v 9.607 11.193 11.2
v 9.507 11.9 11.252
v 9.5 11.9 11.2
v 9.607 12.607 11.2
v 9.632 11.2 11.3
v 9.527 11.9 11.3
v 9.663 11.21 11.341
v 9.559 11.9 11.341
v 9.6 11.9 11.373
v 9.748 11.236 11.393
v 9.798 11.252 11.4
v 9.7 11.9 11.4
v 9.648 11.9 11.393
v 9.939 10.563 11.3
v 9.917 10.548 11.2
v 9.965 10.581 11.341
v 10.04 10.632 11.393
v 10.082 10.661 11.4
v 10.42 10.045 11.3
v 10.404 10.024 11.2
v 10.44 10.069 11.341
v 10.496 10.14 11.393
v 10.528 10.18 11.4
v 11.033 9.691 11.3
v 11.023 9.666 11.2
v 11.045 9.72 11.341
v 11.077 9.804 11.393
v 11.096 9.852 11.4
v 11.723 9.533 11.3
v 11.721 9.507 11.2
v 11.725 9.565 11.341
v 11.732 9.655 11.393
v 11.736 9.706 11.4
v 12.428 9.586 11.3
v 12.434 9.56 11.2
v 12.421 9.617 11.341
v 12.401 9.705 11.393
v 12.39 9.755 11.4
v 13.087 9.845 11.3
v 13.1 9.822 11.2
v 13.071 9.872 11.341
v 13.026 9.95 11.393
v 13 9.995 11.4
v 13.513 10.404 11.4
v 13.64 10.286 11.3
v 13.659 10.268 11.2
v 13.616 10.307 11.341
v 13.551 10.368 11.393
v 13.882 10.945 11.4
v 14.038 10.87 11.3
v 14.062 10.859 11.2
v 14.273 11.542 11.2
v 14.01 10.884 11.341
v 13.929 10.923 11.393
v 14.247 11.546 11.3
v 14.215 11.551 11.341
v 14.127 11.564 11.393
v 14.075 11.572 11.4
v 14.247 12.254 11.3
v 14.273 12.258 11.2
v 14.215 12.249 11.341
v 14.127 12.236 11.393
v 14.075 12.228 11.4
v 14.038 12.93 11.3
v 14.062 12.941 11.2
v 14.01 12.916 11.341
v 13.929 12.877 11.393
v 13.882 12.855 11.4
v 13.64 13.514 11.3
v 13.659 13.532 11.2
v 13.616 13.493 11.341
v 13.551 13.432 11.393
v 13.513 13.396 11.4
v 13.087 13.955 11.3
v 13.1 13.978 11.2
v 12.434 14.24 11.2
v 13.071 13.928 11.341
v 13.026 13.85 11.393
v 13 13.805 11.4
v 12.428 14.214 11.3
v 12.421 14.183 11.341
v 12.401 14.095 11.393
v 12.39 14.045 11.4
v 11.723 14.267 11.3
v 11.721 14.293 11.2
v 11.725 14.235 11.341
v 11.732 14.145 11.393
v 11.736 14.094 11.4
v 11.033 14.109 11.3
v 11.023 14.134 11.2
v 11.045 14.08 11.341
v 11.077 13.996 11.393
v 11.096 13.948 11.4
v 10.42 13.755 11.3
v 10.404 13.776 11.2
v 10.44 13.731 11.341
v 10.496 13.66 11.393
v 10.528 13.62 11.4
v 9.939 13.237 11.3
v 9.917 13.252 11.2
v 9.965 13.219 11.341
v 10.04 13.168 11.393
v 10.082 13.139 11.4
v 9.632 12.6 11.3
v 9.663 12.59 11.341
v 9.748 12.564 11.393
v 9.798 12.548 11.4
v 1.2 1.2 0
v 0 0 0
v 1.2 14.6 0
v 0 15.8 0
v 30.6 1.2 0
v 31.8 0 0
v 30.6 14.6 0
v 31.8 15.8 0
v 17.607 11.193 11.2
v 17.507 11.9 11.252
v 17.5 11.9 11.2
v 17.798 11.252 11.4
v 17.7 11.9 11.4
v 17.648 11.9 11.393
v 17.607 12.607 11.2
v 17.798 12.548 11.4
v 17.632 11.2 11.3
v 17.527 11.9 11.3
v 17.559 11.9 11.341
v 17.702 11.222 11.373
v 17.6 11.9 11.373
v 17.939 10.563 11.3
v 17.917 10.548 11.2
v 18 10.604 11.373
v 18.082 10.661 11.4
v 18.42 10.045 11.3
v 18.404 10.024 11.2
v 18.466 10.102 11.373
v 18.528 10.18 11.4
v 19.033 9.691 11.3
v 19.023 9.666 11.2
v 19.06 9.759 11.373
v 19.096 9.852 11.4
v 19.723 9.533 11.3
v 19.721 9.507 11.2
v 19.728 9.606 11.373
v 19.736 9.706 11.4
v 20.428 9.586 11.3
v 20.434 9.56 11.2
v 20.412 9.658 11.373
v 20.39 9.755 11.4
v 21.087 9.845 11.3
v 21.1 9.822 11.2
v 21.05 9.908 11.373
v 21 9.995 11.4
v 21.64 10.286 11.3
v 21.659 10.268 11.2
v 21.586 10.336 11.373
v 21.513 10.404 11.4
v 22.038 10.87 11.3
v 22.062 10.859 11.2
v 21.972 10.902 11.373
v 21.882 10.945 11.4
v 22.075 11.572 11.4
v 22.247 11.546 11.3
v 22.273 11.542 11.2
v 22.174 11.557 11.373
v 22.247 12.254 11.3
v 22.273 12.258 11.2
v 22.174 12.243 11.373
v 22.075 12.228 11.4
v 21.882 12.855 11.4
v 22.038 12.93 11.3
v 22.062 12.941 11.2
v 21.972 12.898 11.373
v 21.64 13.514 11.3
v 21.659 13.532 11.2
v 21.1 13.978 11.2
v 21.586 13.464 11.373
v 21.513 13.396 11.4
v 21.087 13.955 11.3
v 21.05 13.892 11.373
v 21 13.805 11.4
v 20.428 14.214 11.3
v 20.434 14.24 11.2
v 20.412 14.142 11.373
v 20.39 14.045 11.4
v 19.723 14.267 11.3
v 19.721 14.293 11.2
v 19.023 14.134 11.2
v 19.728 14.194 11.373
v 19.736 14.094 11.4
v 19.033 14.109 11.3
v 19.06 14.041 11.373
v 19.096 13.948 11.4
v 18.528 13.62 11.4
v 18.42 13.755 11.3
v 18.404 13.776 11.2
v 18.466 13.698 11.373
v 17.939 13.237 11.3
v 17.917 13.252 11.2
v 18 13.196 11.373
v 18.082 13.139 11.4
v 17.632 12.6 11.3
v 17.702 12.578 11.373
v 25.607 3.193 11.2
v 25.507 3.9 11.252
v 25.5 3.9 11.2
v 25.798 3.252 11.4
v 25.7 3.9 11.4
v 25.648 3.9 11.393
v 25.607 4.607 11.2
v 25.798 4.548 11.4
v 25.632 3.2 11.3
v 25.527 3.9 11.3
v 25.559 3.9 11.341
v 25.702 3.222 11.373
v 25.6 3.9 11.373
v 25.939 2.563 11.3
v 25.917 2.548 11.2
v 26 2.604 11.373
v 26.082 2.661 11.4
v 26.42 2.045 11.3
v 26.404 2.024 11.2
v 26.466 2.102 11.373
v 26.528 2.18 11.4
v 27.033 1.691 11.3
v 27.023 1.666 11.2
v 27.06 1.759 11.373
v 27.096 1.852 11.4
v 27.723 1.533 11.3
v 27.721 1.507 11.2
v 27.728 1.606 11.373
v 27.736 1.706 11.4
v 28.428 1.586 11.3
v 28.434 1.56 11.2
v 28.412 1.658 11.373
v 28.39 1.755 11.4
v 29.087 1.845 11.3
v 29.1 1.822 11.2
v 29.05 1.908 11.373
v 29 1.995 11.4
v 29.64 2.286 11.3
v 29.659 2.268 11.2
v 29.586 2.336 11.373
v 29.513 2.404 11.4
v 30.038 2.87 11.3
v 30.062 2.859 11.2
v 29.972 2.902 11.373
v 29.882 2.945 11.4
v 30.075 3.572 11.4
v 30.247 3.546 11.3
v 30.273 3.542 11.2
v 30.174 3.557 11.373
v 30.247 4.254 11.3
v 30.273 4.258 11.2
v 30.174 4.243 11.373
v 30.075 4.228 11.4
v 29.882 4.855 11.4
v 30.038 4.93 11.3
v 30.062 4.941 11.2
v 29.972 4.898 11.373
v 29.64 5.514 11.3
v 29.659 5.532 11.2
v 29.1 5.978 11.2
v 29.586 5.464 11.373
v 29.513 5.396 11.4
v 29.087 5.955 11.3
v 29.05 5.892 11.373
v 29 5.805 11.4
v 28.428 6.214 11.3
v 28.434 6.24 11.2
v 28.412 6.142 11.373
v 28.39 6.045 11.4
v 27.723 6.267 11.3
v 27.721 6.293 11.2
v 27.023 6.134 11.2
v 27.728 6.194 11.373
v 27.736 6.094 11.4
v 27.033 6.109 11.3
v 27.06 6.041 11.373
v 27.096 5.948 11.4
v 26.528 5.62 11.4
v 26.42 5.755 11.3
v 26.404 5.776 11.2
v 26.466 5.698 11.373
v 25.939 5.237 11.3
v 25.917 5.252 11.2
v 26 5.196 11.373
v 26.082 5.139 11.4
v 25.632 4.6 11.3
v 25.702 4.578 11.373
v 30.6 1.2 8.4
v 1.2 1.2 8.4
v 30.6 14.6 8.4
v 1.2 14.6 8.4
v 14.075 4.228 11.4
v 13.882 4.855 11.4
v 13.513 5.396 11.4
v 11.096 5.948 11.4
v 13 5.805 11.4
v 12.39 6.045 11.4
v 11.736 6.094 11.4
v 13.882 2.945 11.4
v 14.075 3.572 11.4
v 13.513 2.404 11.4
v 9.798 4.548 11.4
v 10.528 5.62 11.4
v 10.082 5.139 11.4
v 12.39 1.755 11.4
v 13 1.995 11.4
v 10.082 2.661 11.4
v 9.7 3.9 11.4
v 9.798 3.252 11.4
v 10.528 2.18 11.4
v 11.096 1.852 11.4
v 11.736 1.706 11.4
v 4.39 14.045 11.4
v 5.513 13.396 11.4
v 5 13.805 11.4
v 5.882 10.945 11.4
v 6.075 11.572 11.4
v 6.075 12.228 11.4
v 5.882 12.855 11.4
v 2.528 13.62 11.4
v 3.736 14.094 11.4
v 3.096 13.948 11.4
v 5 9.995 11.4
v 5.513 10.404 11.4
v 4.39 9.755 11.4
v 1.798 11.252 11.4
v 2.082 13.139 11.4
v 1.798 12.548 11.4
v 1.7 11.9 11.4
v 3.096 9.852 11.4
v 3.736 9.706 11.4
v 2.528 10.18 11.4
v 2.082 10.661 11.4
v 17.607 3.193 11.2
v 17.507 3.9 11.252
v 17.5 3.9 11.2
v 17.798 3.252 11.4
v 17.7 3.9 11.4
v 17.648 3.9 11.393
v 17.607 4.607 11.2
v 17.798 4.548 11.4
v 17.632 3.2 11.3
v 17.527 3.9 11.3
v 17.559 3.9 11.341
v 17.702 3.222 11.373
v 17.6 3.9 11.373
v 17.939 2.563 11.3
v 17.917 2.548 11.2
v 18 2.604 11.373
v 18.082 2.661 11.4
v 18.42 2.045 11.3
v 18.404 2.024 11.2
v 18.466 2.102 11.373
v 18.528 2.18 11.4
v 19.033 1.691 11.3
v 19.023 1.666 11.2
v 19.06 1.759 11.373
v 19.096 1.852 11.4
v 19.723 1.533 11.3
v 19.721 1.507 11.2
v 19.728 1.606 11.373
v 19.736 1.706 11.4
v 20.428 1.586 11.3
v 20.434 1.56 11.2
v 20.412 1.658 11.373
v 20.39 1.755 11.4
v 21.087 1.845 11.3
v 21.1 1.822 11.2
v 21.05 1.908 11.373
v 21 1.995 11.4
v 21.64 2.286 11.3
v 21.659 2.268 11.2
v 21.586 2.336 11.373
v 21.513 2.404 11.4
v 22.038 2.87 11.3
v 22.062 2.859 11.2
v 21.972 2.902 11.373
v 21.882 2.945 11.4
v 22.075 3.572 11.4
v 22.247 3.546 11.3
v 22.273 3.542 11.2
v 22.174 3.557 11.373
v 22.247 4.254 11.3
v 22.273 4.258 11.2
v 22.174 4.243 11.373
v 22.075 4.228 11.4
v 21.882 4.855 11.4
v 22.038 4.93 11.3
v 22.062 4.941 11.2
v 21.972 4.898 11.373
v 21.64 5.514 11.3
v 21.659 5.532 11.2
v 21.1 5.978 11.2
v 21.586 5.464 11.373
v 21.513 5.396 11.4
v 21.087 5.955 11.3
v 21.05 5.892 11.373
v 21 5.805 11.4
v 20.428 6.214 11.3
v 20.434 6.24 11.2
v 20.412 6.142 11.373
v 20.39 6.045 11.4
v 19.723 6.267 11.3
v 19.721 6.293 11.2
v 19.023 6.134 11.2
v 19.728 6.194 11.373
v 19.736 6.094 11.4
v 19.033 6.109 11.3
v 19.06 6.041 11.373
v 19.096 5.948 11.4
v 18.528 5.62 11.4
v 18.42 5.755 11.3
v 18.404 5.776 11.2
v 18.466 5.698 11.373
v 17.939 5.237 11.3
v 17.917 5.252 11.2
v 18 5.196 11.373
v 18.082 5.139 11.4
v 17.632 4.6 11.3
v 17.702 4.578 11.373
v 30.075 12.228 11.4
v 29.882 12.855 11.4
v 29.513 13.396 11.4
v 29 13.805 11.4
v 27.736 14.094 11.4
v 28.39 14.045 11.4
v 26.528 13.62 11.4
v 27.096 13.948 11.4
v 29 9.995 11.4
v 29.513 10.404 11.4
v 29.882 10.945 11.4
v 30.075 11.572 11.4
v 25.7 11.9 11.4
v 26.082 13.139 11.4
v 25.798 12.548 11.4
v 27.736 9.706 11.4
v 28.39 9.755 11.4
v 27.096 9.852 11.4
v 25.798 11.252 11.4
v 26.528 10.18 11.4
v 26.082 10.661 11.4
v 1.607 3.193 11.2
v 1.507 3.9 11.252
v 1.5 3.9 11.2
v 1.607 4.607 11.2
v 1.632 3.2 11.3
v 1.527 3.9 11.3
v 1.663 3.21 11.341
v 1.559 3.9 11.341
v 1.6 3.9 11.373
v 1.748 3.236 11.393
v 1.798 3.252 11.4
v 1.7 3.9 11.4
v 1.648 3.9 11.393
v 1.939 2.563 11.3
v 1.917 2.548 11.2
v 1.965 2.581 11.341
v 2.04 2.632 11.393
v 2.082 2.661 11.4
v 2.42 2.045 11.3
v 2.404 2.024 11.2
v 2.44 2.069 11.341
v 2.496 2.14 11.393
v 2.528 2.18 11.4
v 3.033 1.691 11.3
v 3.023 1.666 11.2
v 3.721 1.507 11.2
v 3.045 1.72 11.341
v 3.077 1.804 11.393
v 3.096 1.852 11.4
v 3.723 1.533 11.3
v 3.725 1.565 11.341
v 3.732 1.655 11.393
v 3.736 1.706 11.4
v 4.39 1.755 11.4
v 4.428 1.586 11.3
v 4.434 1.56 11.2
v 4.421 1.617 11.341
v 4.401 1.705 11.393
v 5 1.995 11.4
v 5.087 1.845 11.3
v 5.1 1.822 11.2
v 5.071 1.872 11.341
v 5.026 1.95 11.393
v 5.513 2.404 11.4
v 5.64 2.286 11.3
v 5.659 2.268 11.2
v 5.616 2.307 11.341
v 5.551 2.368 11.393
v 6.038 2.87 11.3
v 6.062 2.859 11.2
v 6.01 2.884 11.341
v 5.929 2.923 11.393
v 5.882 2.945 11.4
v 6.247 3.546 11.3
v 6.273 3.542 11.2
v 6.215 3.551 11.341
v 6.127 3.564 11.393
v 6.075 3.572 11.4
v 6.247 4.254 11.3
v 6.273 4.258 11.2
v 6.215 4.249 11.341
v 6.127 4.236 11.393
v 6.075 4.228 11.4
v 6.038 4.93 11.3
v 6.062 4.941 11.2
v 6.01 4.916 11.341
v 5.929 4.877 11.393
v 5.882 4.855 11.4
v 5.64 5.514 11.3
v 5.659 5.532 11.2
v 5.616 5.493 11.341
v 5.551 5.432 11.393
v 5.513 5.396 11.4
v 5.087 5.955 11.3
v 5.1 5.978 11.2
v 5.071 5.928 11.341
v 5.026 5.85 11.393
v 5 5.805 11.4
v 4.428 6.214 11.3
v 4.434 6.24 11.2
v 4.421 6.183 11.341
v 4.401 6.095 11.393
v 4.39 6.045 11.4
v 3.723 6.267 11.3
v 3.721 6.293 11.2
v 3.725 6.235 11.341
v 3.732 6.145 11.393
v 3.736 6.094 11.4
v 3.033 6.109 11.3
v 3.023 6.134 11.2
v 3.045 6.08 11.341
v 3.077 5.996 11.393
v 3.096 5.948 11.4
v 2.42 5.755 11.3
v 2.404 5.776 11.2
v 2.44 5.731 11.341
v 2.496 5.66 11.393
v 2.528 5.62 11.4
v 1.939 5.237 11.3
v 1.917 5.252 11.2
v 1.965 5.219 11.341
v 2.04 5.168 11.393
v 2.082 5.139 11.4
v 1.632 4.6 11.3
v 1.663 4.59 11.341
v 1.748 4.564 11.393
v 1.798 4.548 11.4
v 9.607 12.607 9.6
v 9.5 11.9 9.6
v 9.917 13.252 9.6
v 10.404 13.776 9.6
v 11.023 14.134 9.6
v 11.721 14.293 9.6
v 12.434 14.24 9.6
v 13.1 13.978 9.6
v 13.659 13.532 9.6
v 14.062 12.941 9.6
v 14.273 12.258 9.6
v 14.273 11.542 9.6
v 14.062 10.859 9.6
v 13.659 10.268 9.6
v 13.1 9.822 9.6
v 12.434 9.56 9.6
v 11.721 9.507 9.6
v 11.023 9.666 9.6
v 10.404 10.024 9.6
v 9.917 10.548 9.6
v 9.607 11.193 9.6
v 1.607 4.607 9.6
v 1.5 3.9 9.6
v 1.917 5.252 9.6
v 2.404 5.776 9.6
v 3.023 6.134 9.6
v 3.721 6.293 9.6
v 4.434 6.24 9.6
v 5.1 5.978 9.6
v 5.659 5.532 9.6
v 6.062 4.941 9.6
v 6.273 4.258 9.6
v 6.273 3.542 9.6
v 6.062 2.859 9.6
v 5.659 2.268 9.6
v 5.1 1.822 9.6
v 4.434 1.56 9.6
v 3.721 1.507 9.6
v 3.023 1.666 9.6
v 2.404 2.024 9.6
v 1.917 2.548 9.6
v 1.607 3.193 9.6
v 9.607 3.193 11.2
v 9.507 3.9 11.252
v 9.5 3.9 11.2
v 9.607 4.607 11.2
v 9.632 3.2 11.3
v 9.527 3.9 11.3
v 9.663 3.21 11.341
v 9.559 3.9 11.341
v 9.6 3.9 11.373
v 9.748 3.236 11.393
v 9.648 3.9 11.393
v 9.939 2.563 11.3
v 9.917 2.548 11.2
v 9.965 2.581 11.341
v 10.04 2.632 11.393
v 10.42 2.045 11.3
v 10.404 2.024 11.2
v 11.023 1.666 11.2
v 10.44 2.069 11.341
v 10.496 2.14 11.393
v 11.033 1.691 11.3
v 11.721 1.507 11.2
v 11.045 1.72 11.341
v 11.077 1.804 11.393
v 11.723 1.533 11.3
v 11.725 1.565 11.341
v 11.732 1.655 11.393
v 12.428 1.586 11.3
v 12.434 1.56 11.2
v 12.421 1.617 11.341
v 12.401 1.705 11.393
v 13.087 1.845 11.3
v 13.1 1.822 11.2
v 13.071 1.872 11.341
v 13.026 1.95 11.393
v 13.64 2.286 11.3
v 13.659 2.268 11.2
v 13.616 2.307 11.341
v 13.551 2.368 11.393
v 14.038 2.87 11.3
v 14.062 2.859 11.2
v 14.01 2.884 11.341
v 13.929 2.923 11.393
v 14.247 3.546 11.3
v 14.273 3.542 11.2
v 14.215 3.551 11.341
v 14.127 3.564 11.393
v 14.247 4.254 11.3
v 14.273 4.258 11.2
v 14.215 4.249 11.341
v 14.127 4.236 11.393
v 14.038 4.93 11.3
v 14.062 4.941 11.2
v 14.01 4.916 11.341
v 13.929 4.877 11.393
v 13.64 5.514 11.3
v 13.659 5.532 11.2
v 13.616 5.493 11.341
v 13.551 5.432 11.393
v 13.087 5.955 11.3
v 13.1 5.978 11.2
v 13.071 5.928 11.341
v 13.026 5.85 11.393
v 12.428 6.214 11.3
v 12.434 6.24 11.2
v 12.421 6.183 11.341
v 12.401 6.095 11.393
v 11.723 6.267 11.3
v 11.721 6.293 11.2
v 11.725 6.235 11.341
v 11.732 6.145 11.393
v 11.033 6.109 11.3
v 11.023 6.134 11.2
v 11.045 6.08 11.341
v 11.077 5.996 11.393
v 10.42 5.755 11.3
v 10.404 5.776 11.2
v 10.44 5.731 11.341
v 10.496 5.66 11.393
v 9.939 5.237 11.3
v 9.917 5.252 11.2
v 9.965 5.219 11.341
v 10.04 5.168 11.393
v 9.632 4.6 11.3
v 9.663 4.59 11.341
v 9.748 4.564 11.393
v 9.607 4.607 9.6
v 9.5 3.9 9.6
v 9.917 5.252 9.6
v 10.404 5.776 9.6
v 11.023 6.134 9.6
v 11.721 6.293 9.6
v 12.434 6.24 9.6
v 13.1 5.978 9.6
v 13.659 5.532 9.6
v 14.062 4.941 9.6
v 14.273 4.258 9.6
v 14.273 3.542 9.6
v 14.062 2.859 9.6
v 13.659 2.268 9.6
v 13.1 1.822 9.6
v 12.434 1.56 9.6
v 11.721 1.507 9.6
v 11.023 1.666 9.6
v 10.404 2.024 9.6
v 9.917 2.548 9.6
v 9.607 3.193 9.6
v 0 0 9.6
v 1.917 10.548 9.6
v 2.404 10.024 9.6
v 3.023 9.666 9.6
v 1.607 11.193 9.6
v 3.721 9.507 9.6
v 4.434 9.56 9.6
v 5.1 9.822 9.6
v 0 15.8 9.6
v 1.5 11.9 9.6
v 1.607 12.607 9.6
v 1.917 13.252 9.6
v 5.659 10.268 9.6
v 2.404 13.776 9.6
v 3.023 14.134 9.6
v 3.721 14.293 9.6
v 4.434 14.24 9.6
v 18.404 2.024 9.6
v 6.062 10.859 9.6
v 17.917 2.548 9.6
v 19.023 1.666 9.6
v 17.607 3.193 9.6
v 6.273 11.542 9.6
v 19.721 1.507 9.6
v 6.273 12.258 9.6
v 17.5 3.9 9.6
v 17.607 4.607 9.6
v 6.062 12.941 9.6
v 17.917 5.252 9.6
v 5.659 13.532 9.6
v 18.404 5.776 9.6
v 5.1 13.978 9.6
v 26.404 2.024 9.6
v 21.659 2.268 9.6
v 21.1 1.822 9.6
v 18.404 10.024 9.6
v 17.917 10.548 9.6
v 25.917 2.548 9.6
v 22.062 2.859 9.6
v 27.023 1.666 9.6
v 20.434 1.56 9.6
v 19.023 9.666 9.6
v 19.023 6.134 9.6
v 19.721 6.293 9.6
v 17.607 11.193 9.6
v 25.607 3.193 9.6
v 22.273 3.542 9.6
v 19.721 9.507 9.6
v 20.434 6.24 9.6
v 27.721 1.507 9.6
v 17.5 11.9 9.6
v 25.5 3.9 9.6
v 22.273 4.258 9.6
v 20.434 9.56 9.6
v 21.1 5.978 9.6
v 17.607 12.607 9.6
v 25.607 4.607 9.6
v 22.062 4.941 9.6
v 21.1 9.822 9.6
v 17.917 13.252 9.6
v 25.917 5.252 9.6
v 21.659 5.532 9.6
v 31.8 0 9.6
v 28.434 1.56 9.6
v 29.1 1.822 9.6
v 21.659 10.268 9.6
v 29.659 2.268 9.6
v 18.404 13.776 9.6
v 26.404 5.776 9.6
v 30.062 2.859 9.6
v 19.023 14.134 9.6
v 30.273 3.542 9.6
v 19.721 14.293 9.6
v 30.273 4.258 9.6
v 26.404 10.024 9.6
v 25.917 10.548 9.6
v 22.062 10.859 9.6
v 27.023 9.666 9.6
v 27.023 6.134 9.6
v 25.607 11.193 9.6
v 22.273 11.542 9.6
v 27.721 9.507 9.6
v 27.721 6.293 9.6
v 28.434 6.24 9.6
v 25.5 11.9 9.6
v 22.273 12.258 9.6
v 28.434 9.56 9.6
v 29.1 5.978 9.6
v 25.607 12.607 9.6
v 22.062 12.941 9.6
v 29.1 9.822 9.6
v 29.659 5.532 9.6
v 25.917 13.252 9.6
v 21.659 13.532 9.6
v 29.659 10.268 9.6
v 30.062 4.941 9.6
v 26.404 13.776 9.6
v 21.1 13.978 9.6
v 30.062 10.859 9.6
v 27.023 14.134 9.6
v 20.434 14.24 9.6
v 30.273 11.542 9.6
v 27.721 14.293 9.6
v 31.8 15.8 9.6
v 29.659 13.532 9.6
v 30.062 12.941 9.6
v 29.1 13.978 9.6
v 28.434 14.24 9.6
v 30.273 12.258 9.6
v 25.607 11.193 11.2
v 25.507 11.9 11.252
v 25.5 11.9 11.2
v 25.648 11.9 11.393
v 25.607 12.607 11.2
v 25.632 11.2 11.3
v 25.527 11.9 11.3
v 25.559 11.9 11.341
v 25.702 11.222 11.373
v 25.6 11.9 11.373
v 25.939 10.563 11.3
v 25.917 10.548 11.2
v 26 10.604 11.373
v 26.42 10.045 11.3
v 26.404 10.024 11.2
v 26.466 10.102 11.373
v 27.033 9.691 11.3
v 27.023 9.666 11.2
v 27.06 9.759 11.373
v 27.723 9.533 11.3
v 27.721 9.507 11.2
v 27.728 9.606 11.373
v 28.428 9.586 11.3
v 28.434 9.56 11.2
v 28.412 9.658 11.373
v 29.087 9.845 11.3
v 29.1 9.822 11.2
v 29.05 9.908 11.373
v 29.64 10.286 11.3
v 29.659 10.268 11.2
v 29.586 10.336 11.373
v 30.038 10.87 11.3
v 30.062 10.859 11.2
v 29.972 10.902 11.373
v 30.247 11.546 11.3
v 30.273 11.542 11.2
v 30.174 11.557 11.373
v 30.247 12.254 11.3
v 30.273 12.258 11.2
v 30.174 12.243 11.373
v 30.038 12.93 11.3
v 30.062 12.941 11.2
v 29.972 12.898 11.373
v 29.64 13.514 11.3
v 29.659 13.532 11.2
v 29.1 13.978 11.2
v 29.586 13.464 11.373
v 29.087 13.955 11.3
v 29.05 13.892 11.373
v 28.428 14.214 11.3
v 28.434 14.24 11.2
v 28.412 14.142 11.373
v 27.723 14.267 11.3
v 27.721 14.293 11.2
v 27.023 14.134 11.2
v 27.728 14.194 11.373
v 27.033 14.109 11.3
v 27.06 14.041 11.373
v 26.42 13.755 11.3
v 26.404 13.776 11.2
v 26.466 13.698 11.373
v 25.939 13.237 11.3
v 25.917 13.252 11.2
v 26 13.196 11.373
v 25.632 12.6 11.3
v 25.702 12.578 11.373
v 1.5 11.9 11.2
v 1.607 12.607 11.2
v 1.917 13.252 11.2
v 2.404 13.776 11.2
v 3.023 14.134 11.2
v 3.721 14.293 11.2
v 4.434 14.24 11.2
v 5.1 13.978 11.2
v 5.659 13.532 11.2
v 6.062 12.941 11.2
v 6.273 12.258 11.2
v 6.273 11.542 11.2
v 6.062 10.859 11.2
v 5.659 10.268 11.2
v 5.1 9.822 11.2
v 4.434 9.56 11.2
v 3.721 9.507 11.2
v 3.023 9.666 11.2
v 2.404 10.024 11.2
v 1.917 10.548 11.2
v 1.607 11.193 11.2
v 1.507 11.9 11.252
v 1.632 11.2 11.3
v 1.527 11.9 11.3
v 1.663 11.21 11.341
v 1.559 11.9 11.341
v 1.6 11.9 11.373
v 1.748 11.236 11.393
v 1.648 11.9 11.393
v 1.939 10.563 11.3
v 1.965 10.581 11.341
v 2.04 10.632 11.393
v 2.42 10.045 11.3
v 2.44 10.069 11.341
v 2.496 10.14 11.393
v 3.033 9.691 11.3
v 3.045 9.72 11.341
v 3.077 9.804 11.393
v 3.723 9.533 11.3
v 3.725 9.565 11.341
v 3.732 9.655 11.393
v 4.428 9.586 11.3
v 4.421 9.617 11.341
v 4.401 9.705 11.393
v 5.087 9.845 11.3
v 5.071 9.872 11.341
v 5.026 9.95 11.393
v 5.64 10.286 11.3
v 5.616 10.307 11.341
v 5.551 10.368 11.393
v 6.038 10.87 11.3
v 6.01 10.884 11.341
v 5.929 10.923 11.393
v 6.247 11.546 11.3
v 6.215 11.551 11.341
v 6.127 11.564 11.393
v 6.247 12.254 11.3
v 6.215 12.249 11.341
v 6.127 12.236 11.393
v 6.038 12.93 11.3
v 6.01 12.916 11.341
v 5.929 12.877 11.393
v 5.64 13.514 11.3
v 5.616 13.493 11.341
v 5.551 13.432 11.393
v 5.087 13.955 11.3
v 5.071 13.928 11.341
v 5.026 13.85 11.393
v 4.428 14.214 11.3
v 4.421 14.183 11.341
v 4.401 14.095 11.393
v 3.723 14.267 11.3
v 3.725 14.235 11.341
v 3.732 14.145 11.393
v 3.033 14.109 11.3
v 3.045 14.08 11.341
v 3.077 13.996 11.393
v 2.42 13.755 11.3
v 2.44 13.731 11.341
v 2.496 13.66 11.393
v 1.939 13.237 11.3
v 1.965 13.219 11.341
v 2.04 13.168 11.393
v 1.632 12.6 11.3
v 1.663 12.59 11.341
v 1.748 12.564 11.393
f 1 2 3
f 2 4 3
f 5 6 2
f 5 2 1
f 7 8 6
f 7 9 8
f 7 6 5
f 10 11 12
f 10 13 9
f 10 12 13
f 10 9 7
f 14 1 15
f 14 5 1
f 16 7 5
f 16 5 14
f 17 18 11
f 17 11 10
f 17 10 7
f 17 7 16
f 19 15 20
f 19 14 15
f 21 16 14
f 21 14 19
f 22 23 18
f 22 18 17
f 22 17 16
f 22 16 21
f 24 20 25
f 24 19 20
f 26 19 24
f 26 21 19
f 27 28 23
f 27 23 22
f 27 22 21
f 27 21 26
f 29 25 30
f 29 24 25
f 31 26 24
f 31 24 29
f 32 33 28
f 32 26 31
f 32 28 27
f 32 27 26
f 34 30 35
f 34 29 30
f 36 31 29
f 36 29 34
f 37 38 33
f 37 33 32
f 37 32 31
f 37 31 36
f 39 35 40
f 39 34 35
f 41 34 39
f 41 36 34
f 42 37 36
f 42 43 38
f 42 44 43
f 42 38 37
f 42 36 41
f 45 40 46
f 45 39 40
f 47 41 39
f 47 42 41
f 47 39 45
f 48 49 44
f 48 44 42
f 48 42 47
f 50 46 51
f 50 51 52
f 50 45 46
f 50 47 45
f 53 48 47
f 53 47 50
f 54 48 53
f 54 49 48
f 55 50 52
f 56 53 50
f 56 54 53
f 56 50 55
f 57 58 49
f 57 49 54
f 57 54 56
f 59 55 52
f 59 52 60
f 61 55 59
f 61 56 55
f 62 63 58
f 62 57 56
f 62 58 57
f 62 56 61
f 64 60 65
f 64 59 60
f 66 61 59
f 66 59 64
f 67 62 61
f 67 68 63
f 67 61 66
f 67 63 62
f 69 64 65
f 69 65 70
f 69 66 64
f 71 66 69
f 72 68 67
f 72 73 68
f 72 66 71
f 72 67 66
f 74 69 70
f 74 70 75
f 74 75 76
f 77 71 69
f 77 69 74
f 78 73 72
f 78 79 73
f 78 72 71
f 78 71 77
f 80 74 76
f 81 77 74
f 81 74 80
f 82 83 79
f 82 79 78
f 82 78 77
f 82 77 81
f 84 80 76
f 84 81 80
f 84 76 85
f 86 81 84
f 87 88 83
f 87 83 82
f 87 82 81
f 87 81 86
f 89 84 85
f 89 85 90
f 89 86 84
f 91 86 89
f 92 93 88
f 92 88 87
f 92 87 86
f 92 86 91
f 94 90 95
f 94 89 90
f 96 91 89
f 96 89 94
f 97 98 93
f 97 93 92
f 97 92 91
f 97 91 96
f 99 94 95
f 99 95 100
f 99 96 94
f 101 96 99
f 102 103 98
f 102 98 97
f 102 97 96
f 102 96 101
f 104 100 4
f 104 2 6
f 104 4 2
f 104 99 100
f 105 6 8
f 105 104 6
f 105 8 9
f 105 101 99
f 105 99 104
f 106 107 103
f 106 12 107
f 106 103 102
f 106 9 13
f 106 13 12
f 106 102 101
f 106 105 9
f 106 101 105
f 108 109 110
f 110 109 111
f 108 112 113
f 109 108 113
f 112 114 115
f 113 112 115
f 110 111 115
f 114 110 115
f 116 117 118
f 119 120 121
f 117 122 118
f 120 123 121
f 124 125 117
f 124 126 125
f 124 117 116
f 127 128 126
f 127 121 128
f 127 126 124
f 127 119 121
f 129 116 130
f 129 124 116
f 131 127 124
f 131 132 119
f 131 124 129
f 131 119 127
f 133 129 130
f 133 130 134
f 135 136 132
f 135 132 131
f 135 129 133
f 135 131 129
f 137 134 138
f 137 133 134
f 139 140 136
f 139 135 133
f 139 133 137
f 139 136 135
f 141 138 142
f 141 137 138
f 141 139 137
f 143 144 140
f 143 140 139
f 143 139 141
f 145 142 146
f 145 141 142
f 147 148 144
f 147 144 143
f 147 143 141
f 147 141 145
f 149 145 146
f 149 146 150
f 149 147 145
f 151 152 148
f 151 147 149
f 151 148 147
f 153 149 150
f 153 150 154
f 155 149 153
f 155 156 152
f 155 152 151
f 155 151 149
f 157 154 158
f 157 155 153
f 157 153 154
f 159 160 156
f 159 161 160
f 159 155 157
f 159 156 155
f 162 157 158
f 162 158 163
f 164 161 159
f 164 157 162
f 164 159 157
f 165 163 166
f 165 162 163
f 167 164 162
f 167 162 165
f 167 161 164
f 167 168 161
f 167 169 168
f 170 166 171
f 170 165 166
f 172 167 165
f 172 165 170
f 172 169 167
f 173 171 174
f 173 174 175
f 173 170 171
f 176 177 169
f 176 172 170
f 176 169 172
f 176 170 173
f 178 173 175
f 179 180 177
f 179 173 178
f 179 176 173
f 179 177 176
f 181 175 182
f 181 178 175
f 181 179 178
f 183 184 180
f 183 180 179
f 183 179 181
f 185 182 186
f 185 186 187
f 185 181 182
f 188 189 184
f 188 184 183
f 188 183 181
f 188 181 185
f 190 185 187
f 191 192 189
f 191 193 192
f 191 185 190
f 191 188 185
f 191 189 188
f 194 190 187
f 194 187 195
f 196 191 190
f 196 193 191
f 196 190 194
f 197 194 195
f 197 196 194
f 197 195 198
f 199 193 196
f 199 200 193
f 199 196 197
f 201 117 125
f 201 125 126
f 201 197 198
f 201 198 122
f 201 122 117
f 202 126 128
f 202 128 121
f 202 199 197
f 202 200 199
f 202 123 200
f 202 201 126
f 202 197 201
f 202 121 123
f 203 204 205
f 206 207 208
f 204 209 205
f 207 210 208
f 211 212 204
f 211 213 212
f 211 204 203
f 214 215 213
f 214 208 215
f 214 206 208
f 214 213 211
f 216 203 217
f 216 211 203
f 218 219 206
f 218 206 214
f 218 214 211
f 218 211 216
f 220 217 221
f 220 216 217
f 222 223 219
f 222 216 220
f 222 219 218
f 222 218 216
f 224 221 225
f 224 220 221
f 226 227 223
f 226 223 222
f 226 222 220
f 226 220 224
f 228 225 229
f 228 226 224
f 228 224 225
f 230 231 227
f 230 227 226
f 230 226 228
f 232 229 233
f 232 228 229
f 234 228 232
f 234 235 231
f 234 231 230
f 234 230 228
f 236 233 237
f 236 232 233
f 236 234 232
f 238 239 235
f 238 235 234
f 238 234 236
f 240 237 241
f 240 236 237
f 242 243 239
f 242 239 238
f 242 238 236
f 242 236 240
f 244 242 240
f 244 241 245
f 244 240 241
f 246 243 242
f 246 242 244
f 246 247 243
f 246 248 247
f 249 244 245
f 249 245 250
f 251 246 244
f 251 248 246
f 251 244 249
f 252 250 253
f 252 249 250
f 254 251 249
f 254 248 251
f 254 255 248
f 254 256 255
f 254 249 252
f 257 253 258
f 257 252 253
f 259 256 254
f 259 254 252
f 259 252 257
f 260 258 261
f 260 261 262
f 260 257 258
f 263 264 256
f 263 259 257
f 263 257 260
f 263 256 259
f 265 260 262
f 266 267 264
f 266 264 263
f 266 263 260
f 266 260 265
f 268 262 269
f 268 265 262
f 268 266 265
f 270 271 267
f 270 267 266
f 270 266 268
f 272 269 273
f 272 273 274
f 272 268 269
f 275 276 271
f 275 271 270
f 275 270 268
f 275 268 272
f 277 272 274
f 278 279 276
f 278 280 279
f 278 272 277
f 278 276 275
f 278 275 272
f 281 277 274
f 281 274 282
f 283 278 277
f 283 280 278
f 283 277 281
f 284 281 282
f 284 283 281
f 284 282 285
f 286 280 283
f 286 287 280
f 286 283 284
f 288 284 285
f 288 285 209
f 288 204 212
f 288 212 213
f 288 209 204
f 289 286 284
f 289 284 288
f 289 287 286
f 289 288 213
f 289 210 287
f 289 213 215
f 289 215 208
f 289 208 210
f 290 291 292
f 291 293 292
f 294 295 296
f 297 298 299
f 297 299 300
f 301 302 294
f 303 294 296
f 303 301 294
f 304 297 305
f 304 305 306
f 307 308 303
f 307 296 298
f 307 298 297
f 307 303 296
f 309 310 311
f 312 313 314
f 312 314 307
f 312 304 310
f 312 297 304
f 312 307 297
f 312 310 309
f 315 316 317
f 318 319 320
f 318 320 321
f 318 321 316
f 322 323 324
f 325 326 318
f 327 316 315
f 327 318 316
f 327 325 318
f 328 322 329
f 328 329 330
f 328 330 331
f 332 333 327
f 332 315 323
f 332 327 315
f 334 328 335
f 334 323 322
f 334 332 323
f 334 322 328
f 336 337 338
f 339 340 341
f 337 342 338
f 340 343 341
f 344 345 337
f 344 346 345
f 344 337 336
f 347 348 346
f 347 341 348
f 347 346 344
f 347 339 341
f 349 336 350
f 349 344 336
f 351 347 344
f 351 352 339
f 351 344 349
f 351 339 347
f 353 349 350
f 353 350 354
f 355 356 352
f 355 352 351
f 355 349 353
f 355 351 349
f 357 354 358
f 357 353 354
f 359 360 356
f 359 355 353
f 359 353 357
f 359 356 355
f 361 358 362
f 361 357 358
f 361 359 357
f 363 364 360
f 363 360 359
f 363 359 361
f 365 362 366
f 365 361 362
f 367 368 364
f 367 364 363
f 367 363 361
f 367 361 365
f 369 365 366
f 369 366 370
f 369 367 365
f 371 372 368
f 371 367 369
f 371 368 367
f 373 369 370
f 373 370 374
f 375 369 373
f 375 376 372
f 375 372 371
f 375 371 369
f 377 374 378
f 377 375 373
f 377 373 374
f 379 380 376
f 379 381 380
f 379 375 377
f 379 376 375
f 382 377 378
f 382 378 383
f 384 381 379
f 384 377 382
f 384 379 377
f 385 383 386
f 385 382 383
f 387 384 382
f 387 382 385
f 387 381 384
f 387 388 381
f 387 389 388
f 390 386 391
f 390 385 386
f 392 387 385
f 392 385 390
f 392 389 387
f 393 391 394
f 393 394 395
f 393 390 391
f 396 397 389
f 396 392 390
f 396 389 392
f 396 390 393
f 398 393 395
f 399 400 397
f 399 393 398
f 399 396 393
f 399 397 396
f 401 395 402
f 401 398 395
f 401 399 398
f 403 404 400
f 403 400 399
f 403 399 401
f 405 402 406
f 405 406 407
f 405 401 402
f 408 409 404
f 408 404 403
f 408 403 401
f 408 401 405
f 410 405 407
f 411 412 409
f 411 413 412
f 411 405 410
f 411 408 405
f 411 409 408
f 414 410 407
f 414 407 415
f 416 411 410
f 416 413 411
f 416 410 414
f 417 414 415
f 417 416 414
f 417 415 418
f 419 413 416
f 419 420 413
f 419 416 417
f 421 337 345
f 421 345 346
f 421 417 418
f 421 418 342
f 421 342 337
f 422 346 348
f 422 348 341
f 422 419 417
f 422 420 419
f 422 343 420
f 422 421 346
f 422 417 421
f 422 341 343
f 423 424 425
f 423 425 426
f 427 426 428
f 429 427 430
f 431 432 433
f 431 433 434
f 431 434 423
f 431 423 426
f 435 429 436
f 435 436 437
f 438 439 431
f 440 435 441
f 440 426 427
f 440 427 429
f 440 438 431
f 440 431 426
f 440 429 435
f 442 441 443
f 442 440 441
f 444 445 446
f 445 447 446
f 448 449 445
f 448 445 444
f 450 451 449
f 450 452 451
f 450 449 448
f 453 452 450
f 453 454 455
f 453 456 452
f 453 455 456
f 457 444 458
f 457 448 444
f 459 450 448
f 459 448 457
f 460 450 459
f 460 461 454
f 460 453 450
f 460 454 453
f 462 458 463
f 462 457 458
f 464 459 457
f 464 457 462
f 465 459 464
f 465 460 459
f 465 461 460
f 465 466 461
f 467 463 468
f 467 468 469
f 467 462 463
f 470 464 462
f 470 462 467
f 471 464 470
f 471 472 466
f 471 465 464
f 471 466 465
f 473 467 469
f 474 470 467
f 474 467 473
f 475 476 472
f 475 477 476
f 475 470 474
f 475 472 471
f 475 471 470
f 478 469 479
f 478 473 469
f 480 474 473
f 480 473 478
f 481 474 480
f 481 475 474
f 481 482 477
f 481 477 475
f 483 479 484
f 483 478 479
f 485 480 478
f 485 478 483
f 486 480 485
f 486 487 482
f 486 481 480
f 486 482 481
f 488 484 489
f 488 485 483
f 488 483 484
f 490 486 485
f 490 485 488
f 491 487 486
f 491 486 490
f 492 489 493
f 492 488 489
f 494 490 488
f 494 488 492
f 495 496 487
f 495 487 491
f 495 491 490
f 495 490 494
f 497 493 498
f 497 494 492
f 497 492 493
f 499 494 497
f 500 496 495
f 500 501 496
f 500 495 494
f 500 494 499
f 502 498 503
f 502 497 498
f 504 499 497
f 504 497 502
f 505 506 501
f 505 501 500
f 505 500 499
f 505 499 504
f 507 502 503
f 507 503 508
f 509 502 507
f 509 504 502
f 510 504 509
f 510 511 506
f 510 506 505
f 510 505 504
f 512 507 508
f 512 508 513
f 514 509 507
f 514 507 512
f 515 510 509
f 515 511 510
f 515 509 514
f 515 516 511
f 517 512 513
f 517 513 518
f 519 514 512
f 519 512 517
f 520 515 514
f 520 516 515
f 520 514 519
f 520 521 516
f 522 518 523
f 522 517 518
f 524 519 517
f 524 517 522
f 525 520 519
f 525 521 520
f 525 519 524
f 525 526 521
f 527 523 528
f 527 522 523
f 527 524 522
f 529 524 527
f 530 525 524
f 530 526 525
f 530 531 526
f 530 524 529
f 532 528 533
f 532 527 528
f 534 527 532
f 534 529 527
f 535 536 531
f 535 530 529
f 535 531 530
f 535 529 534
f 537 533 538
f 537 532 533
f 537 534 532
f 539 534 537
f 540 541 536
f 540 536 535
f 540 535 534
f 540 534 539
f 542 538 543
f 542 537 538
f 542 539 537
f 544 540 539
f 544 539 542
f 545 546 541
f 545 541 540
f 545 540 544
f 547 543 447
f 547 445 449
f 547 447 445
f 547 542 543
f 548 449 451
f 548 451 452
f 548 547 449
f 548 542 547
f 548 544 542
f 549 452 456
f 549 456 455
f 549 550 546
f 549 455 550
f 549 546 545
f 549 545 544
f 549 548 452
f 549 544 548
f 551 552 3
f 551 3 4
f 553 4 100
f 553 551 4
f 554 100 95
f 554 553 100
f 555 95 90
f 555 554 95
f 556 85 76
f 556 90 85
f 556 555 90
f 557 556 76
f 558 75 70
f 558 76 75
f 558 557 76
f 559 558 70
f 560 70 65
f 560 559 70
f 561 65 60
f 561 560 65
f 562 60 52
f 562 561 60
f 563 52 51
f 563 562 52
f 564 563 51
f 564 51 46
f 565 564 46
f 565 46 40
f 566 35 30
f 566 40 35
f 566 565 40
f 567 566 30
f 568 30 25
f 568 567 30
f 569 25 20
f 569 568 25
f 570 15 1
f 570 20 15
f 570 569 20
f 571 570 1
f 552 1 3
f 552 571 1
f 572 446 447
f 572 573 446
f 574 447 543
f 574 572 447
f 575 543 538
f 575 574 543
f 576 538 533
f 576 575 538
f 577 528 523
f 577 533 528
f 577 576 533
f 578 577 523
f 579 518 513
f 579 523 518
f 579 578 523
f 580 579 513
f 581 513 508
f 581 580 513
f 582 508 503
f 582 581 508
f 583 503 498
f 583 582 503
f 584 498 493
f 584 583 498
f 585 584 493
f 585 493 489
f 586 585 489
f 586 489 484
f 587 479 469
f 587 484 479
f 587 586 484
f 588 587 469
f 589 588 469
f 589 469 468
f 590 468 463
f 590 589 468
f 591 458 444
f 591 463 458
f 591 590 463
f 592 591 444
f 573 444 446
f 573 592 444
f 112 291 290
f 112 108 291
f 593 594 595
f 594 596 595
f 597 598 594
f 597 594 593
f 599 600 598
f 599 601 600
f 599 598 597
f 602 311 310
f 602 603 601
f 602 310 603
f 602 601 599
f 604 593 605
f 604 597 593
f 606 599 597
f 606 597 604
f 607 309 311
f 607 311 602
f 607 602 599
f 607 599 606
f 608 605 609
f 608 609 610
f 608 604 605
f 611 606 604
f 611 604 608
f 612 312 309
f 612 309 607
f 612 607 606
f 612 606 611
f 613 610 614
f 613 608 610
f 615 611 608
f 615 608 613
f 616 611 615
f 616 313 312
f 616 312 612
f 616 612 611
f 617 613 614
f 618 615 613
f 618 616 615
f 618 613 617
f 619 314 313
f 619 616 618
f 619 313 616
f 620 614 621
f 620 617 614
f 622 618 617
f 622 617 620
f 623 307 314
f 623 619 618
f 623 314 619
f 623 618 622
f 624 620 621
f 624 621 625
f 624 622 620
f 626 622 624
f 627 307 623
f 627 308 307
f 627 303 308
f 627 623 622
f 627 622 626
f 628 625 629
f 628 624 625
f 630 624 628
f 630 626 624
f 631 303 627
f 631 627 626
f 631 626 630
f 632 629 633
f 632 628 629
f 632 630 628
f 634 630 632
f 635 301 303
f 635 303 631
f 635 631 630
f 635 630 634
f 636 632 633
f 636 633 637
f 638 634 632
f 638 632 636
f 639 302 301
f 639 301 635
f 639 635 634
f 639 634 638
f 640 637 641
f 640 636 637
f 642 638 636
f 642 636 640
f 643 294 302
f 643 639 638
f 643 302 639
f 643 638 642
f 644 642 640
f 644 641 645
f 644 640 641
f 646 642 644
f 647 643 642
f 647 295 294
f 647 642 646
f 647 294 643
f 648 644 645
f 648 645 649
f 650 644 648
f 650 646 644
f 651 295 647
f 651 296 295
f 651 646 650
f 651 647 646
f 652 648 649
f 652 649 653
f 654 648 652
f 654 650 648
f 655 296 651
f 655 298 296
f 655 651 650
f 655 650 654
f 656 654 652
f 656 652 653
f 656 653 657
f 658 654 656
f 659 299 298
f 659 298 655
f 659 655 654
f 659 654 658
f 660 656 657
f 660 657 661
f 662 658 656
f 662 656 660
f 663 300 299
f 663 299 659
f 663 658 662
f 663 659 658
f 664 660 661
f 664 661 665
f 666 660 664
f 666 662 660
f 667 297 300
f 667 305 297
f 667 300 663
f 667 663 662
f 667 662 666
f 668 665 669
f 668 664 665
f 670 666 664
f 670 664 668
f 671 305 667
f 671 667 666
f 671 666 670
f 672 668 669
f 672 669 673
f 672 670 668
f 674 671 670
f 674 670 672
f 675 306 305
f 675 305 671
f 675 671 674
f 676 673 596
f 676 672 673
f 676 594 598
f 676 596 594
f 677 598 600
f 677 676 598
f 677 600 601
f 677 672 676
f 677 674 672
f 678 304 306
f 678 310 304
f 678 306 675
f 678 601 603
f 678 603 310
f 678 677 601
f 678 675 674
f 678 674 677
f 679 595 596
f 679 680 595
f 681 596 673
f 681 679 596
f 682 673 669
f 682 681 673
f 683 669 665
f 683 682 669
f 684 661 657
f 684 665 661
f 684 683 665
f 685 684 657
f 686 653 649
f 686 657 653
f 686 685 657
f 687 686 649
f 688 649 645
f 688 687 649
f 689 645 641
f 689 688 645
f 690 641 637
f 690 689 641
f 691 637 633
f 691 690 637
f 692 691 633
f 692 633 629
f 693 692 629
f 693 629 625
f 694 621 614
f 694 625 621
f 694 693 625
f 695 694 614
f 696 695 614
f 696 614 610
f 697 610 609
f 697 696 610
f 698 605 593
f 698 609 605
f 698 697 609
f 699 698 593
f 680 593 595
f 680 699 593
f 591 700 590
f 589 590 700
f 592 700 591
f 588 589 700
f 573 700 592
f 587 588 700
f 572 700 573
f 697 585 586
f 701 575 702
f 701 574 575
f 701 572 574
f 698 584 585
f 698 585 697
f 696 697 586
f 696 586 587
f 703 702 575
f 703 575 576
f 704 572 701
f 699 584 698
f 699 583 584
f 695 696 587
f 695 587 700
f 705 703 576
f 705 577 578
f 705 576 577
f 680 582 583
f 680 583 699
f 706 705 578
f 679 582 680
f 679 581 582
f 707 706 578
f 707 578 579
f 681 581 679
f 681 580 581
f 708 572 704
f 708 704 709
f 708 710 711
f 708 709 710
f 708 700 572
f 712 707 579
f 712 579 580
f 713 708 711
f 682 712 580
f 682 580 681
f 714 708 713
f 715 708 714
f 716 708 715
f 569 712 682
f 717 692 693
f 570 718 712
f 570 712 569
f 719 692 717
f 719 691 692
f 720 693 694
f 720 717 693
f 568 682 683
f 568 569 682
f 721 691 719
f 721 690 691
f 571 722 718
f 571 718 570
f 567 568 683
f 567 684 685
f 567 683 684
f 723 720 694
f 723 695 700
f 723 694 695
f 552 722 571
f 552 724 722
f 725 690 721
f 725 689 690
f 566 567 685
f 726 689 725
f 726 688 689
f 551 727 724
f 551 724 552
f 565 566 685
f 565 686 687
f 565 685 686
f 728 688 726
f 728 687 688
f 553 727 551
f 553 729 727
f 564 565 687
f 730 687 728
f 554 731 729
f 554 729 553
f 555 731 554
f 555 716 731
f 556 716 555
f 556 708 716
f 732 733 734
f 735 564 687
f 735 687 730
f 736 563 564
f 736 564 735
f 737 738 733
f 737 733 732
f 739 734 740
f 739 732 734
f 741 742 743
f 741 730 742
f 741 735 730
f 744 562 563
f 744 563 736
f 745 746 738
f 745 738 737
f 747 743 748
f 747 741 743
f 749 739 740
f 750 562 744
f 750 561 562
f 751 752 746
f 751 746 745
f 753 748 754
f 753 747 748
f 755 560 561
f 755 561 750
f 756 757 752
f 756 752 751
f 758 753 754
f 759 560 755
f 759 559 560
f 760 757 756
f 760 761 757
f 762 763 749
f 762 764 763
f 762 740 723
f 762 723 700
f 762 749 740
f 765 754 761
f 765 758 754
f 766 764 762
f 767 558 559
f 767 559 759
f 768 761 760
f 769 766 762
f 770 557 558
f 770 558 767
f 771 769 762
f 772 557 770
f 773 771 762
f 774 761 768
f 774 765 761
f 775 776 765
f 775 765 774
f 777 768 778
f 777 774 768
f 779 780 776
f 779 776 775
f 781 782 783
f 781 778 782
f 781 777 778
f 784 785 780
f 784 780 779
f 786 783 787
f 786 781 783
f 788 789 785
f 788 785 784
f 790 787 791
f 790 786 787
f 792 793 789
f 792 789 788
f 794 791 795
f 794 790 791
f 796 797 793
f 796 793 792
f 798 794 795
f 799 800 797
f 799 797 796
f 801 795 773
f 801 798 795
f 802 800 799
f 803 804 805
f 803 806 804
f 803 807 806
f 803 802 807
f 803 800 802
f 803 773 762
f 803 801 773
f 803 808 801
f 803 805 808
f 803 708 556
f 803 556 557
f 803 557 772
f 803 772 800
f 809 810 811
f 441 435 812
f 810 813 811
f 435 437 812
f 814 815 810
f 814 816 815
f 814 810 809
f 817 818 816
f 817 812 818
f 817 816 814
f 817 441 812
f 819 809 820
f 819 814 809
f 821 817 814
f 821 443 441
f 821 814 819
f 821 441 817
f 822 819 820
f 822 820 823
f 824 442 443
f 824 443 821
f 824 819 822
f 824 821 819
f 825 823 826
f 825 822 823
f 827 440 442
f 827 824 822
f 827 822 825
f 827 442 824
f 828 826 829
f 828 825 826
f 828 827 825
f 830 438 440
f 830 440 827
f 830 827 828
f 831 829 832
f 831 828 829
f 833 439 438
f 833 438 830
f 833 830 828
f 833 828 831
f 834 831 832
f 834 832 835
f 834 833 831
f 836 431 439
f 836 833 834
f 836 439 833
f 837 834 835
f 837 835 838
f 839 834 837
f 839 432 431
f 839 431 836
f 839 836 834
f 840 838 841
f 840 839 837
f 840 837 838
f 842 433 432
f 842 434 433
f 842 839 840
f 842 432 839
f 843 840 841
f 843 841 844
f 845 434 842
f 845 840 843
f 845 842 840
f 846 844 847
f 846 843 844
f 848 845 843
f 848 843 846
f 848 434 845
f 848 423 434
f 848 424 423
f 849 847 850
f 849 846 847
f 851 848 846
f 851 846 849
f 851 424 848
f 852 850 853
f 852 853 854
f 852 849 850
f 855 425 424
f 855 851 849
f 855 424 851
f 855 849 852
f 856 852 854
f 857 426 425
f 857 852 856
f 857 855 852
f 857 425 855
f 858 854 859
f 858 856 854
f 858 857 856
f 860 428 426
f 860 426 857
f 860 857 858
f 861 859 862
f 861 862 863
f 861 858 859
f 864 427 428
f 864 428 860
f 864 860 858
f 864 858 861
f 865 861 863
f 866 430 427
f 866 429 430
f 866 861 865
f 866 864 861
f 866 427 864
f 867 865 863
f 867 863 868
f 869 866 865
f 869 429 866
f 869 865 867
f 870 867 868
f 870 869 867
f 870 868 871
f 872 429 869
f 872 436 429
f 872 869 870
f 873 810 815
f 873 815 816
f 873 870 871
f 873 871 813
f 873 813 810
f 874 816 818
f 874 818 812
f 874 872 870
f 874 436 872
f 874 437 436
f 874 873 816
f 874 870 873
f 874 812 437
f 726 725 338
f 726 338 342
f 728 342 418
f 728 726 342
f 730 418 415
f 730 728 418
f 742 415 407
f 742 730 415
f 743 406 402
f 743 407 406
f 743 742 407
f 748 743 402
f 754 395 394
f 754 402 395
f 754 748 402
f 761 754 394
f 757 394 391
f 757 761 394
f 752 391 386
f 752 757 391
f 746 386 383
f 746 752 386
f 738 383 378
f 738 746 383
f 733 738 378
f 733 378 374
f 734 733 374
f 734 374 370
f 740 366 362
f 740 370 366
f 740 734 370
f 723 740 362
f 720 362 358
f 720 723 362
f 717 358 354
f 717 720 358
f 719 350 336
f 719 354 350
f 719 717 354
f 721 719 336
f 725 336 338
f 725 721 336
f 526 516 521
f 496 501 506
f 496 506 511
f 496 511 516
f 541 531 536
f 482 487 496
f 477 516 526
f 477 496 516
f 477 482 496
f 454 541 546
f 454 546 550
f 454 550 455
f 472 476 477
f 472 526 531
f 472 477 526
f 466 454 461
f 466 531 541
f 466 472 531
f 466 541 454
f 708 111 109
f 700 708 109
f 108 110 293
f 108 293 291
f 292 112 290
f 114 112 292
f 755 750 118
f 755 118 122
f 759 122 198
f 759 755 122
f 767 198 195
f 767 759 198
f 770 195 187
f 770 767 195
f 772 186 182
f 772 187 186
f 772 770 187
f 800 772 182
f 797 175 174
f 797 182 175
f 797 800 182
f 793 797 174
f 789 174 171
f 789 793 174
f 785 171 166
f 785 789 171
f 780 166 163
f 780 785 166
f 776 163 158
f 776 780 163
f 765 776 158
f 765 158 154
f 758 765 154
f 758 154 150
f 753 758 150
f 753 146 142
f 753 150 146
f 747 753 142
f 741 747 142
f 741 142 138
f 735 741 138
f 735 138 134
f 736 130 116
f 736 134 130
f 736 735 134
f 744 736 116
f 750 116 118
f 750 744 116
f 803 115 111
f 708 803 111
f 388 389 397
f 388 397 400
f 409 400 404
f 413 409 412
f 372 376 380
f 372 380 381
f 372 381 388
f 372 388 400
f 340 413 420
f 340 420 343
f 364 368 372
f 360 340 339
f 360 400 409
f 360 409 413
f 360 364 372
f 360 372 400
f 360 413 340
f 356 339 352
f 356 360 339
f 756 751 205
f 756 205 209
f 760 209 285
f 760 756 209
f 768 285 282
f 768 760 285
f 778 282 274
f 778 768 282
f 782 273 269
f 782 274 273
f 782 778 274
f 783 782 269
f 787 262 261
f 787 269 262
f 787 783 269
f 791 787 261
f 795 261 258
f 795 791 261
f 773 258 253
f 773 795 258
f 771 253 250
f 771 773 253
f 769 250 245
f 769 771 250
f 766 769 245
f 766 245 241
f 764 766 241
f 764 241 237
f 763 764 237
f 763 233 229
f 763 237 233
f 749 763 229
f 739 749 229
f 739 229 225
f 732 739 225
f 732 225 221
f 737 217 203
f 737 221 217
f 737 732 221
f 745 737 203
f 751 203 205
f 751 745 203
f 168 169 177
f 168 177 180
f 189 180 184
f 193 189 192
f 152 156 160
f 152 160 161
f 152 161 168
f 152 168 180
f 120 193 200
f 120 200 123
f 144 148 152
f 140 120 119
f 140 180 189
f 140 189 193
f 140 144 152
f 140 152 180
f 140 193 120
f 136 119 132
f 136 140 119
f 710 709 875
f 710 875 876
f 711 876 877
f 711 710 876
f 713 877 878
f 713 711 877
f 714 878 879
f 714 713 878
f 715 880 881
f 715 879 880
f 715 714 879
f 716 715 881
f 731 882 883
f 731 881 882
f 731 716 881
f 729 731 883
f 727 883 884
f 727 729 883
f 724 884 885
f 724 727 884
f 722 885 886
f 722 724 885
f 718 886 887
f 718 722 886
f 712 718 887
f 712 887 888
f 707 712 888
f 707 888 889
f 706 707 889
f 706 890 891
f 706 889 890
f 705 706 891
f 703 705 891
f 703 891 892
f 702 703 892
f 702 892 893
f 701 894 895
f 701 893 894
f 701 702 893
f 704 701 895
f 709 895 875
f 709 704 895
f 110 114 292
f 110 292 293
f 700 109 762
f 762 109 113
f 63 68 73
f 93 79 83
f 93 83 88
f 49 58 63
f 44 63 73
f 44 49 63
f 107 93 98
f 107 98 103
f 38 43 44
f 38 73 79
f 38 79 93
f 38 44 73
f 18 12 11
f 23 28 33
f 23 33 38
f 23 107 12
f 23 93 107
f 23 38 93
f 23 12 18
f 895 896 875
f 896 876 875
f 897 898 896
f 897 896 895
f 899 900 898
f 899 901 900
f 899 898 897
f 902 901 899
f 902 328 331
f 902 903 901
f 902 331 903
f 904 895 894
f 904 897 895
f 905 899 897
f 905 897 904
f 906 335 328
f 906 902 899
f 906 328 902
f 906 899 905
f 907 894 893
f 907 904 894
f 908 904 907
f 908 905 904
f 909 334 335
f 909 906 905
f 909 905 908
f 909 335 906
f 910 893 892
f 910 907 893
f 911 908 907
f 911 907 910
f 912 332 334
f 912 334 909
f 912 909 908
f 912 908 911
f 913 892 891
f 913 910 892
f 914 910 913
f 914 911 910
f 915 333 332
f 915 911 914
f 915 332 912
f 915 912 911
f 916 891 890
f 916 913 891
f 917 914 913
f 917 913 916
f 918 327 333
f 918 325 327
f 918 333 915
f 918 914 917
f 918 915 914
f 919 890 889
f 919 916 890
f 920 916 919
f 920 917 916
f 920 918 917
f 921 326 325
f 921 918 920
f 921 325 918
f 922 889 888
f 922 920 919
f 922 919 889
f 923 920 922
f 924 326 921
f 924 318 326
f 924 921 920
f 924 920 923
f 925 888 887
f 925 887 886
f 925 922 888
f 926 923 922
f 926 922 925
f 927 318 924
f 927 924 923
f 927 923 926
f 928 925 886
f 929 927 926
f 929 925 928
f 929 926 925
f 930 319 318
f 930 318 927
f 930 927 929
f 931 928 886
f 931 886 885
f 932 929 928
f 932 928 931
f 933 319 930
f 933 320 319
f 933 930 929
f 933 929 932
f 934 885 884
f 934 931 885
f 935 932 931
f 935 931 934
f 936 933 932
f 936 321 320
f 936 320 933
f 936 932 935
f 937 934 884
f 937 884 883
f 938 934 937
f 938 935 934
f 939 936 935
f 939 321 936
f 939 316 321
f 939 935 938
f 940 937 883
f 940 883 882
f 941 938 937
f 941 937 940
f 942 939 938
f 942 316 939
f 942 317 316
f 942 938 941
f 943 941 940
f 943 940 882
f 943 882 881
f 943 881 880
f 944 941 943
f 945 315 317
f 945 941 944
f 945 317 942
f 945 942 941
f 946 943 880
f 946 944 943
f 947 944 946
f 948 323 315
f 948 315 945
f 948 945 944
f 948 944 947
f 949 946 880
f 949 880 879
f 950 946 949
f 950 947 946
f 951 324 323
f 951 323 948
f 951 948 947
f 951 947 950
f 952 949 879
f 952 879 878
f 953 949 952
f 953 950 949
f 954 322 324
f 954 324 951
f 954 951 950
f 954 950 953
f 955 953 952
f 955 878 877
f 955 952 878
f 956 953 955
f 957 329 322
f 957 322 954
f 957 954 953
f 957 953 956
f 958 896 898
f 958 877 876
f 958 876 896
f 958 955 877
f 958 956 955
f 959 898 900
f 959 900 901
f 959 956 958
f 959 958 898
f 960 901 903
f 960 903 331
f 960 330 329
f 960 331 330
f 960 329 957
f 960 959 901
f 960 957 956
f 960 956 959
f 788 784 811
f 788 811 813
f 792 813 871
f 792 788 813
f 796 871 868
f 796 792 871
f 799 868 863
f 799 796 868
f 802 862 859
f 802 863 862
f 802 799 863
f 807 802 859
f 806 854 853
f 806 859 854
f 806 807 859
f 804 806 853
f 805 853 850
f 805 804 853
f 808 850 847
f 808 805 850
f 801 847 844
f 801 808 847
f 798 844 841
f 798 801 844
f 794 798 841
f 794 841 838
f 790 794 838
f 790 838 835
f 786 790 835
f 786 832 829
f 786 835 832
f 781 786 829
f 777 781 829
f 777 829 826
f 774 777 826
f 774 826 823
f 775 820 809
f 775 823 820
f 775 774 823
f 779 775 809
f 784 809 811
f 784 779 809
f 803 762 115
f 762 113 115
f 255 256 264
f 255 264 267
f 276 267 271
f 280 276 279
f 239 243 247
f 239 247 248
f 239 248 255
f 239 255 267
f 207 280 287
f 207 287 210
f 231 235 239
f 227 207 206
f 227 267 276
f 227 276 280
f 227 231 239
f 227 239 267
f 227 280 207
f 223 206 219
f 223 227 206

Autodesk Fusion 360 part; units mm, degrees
sketch "Sketch1" plane through (0, 0, 0) normal (0, 0, 1) x (1, 0, 0)
  line L0 (0, 0) -> (31.8, 0)
  line L1 (31.8, 0) -> (31.8, 15.8)
  line L2 (31.8, 15.8) -> (0, 15.8)
  line L3 (0, 15.8) -> (0, 0)
  dimension "d3" = 31.8
  dimension "d4" = 15.8
extrude "Extrude1" add sketch "Sketch1" along normal blind 9.6
shell "Shell1" thickness 1.2 removed faces 1 at (21.2, 5.2667, 0)
sketch "Sketch2" plane through (0, 0, 9.6) normal (0, 0, 1) x (-1, 0, 0)
  line L0 (0, -15.8) -> (0, 0)
  line L1 (0, 0) -> (-31.8, 0)
  line L2 (-31.8, 0) -> (-31.8, -15.8)
  line L3 (-31.8, -15.8) -> (0, -15.8)
  circle A0 centre (-3.9, -11.9) radius 2.4
  dimension "d8" = 4.8
  dimension "d9" = 3.9
  dimension "d10" = 3.9
extrude "Extrude2" add sketch "Sketch2" along normal blind 1.8 contours A0
fillet "Fillet1" radius 0.2 1 edges at (6.1376, 12.7679, 11.4)
pattern_linear "R-Pattern1" count 4 spacing 8 along (1, 0, 0) count 2 spacing 8 along (0, -1, 0) of "Extrude2", "Fillet1"
equation "d3 = ( 3.9 * 2 ) * 1 mm + ( 8.0 * ( n_orizzontale - 1 ) ) * 1 mm"
equation "d4 = ( 3.9 * 2 ) * 1 mm + ( 8.0 * ( n_verticale - 1 ) ) * 1 mm"
